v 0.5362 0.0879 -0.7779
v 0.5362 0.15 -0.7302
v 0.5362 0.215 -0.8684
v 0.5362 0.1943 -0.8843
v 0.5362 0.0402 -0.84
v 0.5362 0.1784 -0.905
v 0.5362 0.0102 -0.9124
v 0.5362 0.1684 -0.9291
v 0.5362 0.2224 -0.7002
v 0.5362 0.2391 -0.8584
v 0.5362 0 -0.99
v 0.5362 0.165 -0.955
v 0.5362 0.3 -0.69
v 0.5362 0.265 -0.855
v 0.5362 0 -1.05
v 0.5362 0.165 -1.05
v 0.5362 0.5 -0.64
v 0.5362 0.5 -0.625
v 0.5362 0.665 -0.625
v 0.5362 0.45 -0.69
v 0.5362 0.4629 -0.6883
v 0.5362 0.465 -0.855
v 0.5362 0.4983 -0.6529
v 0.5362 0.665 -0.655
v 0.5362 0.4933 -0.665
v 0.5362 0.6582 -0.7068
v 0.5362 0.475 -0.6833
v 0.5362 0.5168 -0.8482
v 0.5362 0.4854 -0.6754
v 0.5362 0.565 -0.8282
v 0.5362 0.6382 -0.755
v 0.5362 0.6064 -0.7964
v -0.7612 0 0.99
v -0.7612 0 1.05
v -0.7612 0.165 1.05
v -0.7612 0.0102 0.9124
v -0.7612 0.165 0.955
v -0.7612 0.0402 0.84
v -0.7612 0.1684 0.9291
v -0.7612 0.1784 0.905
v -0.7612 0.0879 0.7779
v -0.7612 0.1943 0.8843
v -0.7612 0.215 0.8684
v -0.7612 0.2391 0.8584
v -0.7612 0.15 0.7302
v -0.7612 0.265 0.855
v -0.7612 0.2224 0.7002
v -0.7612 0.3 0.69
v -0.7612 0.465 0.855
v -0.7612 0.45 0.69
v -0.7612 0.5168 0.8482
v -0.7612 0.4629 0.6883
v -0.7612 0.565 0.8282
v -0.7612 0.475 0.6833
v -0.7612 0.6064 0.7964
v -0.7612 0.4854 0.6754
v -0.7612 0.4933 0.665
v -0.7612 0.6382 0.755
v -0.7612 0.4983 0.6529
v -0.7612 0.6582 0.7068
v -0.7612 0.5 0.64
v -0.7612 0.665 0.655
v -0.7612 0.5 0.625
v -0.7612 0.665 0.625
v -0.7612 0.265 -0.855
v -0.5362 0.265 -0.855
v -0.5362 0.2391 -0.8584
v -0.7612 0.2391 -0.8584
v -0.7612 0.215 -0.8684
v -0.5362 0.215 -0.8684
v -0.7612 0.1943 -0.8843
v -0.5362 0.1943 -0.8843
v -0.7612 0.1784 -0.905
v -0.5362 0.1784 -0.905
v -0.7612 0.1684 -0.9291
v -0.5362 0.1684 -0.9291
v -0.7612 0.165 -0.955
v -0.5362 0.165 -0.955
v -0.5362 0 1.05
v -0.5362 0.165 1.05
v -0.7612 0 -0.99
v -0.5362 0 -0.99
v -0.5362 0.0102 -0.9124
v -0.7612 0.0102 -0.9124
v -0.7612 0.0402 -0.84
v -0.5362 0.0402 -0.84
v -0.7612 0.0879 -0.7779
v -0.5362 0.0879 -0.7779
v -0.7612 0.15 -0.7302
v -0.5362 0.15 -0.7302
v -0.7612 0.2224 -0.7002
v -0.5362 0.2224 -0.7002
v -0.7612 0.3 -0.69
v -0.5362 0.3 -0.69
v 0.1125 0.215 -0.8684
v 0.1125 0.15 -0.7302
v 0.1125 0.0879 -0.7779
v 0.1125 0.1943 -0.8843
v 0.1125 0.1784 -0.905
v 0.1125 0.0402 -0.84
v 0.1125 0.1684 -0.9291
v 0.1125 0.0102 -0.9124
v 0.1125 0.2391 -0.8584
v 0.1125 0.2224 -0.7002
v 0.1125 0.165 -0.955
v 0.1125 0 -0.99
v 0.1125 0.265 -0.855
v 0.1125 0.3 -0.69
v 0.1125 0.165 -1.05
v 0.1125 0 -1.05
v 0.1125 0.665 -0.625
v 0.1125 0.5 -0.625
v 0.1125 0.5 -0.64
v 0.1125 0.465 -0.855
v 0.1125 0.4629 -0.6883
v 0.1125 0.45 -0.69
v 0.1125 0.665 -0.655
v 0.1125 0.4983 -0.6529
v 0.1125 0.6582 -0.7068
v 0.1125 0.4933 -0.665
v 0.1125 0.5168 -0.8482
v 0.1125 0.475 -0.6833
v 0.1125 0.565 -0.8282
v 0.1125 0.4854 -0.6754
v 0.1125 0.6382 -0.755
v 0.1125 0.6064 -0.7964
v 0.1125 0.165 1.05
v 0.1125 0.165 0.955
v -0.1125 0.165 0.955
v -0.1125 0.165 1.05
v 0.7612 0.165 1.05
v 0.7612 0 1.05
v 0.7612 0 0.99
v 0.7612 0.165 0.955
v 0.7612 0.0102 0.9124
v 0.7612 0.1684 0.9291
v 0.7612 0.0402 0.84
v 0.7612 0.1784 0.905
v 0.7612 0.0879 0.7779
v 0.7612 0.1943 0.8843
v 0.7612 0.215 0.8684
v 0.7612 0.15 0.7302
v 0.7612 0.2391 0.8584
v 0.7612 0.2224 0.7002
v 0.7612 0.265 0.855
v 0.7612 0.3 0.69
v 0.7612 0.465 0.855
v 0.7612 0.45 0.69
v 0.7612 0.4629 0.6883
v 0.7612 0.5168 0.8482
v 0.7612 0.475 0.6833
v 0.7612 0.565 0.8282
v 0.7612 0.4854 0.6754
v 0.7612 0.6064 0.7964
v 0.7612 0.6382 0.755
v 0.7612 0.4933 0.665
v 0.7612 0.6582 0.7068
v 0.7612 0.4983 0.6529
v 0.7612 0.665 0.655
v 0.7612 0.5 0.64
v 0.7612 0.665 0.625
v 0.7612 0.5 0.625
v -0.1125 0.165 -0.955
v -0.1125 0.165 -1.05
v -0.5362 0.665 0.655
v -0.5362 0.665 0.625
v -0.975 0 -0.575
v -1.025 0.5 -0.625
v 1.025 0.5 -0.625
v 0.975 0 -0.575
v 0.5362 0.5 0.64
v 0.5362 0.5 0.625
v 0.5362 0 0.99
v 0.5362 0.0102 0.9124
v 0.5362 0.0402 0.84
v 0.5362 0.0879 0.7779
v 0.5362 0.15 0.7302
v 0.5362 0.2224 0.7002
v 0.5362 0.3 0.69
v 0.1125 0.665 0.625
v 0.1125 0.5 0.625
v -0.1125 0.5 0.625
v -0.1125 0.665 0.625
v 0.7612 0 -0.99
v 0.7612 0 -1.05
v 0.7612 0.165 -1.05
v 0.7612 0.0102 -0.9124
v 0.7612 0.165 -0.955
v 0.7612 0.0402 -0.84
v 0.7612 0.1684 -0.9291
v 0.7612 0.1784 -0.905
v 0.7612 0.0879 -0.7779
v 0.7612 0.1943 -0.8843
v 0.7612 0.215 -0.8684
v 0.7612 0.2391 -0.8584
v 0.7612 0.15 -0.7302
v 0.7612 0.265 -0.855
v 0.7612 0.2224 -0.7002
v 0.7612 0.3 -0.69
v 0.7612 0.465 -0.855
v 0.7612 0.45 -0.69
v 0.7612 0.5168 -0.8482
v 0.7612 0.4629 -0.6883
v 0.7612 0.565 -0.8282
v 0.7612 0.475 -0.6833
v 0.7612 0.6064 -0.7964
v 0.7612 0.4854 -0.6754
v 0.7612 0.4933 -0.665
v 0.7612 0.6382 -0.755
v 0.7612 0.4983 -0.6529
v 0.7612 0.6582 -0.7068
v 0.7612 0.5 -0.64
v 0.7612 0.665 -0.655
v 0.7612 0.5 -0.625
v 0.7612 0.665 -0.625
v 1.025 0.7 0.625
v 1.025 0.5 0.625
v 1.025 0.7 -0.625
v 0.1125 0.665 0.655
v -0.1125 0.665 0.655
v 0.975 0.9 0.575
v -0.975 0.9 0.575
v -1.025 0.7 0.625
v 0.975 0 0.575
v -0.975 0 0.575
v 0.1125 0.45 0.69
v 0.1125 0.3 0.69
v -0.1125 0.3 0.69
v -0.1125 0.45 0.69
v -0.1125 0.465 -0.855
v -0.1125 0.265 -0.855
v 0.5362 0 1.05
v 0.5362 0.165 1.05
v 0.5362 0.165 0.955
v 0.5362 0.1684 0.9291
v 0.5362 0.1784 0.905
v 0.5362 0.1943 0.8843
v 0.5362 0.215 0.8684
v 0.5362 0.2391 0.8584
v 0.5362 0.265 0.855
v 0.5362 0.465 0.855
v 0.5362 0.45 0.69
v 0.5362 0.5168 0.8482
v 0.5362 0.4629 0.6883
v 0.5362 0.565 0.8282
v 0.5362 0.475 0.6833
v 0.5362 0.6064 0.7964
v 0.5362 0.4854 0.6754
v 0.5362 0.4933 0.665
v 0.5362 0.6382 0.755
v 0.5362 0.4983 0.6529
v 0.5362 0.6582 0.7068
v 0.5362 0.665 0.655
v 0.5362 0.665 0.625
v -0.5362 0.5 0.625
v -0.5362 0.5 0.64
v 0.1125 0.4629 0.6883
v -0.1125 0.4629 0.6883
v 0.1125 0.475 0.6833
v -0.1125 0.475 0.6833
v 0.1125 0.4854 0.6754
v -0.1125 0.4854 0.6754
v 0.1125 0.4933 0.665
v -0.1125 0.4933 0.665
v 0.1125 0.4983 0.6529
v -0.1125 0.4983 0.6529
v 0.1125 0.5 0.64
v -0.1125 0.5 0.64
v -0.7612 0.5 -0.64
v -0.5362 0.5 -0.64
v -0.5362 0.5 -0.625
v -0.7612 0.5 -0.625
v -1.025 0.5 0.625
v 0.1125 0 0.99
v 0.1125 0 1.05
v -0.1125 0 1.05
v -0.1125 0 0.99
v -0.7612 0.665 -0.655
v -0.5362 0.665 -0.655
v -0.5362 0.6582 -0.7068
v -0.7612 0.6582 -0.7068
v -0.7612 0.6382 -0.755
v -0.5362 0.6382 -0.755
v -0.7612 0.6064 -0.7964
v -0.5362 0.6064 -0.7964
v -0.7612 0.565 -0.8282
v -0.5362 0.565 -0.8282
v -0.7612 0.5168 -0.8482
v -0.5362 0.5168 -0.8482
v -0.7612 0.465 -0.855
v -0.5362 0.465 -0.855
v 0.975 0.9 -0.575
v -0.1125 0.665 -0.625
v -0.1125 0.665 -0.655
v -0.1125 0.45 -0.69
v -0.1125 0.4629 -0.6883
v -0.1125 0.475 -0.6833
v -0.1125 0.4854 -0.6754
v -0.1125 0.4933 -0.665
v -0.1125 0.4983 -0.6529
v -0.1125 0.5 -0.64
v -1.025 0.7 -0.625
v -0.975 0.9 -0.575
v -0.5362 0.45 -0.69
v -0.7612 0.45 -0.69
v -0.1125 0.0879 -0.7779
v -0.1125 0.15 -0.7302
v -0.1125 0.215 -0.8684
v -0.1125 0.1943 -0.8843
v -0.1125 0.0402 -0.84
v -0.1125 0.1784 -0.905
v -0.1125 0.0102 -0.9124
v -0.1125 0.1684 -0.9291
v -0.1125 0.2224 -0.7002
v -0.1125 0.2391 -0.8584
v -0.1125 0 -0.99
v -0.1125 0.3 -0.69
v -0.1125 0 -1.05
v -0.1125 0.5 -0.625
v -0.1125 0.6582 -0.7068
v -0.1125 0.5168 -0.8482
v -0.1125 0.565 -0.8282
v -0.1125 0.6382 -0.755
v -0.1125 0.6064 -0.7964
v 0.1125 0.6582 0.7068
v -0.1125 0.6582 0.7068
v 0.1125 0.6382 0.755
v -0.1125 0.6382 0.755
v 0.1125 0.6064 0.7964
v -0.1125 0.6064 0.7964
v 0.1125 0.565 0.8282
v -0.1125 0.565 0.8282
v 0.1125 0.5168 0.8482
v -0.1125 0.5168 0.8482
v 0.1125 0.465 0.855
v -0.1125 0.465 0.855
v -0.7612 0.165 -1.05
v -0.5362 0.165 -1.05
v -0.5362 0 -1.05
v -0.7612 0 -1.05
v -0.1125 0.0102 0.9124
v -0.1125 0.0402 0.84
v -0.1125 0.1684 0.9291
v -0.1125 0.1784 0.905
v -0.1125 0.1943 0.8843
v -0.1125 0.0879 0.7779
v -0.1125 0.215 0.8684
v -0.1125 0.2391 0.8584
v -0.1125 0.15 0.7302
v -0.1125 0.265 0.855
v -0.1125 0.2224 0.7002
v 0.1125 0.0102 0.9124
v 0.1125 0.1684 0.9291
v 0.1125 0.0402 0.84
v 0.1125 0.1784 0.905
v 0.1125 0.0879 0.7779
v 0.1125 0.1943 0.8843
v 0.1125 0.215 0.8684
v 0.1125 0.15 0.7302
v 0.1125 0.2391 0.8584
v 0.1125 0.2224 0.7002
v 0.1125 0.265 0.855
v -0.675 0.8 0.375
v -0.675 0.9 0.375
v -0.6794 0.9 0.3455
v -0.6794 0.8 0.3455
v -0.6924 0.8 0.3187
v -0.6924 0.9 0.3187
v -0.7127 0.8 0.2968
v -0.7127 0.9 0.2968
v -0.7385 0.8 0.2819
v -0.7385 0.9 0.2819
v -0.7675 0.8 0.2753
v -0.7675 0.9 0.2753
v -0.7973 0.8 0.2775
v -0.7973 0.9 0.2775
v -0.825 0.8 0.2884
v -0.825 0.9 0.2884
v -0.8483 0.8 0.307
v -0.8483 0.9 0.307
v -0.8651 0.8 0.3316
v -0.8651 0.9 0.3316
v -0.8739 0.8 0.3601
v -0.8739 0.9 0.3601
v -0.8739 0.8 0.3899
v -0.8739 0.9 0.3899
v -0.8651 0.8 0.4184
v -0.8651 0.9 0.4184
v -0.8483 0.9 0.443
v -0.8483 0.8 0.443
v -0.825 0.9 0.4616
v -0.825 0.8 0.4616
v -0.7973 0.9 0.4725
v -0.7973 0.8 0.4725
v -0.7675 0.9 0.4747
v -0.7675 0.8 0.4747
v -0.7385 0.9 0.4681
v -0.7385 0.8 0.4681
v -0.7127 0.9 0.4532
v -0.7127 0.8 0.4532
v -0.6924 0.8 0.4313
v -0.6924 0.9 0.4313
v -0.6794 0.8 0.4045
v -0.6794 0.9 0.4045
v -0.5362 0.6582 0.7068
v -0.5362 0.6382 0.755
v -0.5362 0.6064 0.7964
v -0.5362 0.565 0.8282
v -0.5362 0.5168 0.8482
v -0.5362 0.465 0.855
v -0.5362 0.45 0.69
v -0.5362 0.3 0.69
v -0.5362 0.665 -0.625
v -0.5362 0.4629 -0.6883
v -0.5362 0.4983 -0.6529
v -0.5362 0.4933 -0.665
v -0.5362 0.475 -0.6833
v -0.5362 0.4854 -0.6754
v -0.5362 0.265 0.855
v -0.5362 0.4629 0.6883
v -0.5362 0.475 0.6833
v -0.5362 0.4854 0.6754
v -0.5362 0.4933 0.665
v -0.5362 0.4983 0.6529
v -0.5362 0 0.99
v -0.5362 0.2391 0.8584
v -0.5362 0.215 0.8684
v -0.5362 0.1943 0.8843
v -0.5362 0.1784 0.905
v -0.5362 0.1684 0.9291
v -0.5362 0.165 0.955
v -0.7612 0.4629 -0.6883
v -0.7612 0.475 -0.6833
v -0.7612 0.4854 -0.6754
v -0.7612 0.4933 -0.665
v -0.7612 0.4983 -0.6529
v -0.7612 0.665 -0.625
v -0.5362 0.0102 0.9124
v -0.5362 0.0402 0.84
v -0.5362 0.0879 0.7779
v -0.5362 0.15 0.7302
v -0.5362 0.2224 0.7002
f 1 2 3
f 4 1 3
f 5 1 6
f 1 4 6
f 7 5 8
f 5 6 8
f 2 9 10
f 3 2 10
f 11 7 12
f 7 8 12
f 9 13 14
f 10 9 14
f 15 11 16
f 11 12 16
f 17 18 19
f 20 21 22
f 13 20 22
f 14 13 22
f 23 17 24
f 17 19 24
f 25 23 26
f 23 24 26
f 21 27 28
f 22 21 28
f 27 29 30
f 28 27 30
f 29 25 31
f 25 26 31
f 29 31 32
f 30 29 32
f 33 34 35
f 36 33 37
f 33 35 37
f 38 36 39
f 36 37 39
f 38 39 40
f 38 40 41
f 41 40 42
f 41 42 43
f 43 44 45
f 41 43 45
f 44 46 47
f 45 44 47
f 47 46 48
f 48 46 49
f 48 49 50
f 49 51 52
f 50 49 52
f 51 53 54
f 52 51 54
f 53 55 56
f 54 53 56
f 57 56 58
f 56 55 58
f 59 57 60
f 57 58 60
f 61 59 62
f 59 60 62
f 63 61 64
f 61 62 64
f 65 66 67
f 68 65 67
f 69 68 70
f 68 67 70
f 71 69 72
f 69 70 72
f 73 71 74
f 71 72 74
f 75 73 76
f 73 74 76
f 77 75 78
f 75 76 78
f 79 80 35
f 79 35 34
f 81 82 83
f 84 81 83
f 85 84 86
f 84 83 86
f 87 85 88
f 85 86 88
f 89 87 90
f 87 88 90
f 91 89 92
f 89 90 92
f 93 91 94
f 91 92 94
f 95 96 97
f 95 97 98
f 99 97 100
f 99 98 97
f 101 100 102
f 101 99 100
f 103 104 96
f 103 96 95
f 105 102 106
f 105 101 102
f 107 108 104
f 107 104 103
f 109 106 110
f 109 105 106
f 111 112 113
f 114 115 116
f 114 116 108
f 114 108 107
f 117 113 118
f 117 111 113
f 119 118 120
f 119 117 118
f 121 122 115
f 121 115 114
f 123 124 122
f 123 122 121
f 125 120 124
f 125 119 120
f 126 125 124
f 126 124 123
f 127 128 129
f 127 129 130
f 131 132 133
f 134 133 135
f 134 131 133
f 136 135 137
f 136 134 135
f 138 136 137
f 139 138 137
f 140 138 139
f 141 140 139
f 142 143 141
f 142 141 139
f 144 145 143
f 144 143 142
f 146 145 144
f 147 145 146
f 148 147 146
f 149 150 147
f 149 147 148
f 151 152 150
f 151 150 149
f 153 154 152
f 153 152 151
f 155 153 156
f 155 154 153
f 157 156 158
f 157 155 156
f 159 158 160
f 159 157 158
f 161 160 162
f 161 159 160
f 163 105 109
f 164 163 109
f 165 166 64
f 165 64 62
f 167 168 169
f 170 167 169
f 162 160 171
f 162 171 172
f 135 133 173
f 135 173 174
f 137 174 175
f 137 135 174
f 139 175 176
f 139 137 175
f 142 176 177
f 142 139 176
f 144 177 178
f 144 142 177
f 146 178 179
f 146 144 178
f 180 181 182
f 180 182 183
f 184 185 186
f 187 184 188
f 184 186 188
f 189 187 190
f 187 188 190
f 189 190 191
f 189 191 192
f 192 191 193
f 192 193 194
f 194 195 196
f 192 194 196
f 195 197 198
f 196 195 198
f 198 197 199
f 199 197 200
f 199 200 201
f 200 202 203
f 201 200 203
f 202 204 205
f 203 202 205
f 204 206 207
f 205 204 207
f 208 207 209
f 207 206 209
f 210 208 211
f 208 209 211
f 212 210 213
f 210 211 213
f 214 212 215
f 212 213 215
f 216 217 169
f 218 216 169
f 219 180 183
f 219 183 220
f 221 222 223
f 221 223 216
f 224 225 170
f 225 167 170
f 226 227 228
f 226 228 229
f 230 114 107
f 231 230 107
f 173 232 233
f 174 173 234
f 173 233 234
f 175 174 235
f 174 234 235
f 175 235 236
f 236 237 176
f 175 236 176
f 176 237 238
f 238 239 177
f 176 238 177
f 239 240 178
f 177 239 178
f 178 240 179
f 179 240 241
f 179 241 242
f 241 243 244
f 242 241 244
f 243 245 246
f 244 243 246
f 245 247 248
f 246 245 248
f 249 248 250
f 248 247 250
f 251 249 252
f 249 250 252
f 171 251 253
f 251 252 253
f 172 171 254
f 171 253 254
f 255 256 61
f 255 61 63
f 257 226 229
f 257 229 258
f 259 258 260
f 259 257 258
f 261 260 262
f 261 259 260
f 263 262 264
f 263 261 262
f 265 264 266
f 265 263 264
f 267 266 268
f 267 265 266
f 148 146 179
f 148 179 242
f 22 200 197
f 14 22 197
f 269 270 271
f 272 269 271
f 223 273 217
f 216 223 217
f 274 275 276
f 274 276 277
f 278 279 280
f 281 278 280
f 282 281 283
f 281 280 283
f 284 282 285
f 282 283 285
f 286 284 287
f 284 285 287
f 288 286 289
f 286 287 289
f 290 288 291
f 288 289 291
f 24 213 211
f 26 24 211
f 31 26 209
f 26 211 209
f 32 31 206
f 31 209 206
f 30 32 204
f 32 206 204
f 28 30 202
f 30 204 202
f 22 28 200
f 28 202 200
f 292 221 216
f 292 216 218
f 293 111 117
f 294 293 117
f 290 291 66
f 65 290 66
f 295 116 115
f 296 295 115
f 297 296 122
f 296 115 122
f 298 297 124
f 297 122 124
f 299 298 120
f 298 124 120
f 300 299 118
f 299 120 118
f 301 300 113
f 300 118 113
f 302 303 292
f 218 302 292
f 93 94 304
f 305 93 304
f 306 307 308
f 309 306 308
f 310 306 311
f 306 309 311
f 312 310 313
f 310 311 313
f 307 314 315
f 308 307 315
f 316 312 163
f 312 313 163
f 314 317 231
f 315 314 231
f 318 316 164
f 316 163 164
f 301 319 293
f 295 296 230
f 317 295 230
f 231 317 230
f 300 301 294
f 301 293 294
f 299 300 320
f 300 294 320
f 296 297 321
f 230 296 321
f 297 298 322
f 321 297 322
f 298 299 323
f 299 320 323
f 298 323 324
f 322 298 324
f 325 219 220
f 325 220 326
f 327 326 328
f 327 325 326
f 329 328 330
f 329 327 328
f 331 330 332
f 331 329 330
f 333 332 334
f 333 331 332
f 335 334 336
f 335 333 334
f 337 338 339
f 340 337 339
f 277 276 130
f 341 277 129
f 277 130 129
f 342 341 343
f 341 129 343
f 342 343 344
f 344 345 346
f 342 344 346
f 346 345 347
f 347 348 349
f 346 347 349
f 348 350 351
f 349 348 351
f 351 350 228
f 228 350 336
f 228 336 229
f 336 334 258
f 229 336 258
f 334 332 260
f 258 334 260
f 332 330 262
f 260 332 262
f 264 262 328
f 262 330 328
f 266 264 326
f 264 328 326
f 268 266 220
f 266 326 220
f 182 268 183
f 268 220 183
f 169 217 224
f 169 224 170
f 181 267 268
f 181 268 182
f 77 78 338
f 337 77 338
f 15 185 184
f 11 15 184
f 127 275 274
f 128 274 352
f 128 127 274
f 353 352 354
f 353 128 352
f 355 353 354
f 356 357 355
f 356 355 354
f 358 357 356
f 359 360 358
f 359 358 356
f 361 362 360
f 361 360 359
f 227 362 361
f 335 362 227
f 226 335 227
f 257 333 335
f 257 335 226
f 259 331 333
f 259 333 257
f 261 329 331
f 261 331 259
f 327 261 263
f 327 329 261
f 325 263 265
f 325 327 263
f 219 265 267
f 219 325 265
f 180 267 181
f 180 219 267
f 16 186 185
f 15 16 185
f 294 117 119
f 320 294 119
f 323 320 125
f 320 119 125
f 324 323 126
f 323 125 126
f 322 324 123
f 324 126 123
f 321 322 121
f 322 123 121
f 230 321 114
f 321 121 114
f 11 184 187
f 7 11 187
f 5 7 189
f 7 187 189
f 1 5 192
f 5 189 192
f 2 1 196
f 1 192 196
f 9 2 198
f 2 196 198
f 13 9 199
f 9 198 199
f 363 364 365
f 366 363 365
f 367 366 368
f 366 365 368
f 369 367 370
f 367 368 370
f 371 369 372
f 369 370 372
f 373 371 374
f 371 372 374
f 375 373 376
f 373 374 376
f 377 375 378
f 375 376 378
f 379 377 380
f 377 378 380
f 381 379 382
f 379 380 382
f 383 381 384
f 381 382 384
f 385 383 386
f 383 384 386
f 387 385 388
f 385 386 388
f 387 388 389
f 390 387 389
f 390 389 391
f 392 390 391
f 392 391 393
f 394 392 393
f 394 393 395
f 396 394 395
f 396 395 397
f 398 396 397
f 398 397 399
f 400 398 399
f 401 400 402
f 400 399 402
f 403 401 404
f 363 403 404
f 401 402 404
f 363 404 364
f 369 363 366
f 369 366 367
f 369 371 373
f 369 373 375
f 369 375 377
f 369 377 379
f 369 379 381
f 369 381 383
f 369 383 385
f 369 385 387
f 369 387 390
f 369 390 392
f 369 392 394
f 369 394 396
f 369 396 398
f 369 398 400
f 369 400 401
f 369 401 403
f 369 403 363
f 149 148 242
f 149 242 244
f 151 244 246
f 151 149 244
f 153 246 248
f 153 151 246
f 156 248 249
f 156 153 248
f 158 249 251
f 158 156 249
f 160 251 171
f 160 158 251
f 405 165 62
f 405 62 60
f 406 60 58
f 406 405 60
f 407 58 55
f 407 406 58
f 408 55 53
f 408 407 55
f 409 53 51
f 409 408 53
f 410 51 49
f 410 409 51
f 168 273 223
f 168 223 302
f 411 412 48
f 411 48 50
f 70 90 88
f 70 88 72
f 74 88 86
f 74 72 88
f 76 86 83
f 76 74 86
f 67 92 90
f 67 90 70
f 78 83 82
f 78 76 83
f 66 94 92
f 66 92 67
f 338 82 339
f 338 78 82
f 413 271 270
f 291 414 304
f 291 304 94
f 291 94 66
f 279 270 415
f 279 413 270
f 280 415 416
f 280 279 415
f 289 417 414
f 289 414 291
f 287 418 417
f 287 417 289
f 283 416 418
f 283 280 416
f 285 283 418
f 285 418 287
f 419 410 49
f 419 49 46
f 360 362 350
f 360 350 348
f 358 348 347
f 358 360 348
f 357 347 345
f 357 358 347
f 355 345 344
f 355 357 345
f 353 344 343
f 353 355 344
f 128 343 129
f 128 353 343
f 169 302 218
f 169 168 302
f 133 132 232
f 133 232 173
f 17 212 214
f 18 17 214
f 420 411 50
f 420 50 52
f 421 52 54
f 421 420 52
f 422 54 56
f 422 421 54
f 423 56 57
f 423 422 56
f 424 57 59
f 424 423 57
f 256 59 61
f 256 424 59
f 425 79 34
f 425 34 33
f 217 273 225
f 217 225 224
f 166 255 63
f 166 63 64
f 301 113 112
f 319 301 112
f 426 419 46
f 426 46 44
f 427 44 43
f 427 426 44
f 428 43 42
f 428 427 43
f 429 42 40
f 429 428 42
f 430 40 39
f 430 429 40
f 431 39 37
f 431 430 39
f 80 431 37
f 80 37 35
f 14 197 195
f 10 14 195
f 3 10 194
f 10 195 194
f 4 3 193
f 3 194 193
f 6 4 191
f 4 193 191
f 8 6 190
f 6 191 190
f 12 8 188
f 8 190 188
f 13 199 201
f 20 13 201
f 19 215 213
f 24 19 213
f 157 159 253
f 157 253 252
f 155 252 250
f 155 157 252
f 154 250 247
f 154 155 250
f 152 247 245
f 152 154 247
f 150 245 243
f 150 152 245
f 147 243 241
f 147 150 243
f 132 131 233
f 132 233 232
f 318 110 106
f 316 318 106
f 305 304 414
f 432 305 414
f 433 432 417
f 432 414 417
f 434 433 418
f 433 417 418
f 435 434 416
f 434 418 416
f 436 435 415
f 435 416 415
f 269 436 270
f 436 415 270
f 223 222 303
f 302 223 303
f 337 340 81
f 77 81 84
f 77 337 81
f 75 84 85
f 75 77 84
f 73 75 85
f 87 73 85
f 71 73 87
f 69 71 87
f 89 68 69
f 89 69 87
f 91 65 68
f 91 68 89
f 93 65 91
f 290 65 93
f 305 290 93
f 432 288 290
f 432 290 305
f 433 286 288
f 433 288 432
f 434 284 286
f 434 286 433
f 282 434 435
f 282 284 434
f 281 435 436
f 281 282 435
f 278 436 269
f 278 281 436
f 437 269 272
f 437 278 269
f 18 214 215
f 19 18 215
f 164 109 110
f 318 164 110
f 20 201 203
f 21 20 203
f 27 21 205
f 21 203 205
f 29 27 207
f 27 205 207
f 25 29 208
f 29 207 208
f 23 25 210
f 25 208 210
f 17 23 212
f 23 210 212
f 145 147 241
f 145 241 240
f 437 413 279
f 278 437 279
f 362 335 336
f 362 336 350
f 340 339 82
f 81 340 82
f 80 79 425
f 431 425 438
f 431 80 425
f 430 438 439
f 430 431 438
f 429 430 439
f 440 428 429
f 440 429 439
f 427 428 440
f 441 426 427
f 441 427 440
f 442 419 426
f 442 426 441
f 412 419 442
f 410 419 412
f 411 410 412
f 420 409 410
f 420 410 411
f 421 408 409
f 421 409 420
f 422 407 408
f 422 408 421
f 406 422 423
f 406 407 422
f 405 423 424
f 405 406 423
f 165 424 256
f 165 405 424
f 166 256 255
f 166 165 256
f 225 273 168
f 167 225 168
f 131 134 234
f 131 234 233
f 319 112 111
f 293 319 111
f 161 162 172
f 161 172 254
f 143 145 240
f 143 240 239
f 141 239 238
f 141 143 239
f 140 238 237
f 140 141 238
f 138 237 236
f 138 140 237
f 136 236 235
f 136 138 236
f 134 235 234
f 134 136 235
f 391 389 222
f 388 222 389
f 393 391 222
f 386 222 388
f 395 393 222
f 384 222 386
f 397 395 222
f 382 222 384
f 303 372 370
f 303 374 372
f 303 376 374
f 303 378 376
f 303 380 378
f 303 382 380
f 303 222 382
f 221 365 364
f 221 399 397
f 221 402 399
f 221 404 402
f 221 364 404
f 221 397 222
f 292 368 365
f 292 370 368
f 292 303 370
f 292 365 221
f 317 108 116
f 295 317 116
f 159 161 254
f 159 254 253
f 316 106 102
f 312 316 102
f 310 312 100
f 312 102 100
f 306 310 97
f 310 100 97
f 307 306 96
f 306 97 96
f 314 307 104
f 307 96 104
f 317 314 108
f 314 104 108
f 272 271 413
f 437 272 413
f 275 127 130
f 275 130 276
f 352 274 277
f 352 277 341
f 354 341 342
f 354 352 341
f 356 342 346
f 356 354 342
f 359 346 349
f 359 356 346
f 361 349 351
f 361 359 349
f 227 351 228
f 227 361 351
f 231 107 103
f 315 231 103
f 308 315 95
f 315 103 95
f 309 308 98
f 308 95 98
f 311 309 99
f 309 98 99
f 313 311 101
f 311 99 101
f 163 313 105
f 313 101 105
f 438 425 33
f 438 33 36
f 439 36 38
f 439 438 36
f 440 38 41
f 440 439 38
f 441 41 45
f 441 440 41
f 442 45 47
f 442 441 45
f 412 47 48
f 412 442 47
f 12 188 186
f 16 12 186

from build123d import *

# Parameters (mm, degrees)
SKETCH1_W             = 2.05
SKETCH1_H             = 1.25
BOSS_EXTRUDE1_DEPTH   = 0.9
BOSS_EXTRUDE2_START   = -1.025
BOSS_EXTRUDE2_DEPTH   = 0.76125
BOSS_EXTRUDE2_2_DEPTH = 0.76125
SKETCH3_W             = 0.42375
SKETCH3_H             = 0.425
CUT_EXTRUDE2_DEPTH    = 0.9
CHAMFER1_SIZE         = 0.05
CHAMFER1_SIZE2        = 0.5
CHAMFER2_SIZE         = 0.2
CHAMFER2_SIZE2        = 0.05
CHAMFER2_PART_2_SIZE  = 0.2
CHAMFER2_PART_2_SIZE2 = 0.05
CHAMFER2_PART_3_SIZE  = 0.2
CHAMFER2_PART_3_SIZE2 = 0.05
CHAMFER2_PART_4_SIZE  = 0.2
CHAMFER2_PART_4_SIZE2 = 0.05
SKETCH4_R             = 0.1
CUT_EXTRUDE3_DEPTH    = 0.1


with BuildPart() as part:
    # Sketch1 → Boss-Extrude1 (new body)
    with BuildSketch(Plane(origin=(0, 0, 0), x_dir=(1, 0, 0), z_dir=(0, 1, 0))):
        Rectangle(SKETCH1_W, SKETCH1_H)
    extrude(amount=BOSS_EXTRUDE1_DEPTH)

    # Chamfer1
    chamfer1_edges = [part.edges().sort_by_distance(p)[0] for p in [
        (0, 0, 0.625),
        (-1.025, 0, 0),
        (0, 0, -0.625),
        (1.025, 0, 0),
    ]]
    chamfer1_side = [part.faces().sort_by_distance(p)[0] for p in [
        (0, 0, 0),
    ]]
    chamfer(chamfer1_edges, length=CHAMFER1_SIZE, length2=CHAMFER1_SIZE2, reference=chamfer1_side[0])

    # Chamfer2
    chamfer2_edges = [part.edges().sort_by_distance(p)[0] for p in [
        (-1.025, 0.9, 0),
    ]]
    chamfer2_side = [part.faces().sort_by_distance(p)[0] for p in [
        (-1.025, 0.7, 0),
    ]]
    chamfer(chamfer2_edges, length=CHAMFER2_SIZE, length2=CHAMFER2_SIZE2, reference=chamfer2_side[0])

    # Chamfer2 part 2
    chamfer2_part_2_edges = [part.edges().sort_by_distance(p)[0] for p in [
        (0, 0.9, 0.625),
    ]]
    chamfer2_part_2_side = [part.faces().sort_by_distance(p)[0] for p in [
        (0, 0.7, 0.625),
    ]]
    chamfer(chamfer2_part_2_edges, length=CHAMFER2_PART_2_SIZE, length2=CHAMFER2_PART_2_SIZE2, reference=chamfer2_part_2_side[0])

    # Chamfer2 part 3
    chamfer2_part_3_edges = [part.edges().sort_by_distance(p)[0] for p in [
        (1.025, 0.9, 0),
    ]]
    chamfer2_part_3_side = [part.faces().sort_by_distance(p)[0] for p in [
        (1.025, 0.7, 0),
    ]]
    chamfer(chamfer2_part_3_edges, length=CHAMFER2_PART_3_SIZE, length2=CHAMFER2_PART_3_SIZE2, reference=chamfer2_part_3_side[0])

    # Chamfer2 part 4
    chamfer2_part_4_edges = [part.edges().sort_by_distance(p)[0] for p in [
        (0, 0.9, -0.625),
    ]]
    chamfer2_part_4_side = [part.faces().sort_by_distance(p)[0] for p in [
        (0, 0.7, -0.625),
    ]]
    chamfer(chamfer2_part_4_edges, length=CHAMFER2_PART_4_SIZE, length2=CHAMFER2_PART_4_SIZE2, reference=chamfer2_part_4_side[0])

    # Sketch4 → Cut-Extrude3 (cut)
    with BuildSketch(Plane(origin=(0, 0.9, 0), x_dir=(1, 0, 0), z_dir=(0, 1, 0))):
        with Locations((-0.775, -0.375)):
            Circle(SKETCH4_R)
    extrude(amount=-CUT_EXTRUDE3_DEPTH, mode=Mode.SUBTRACT)


with BuildPart() as body_2:
    # Sketch2 → Boss-Extrude2 (new body, symmetric)
    with BuildSketch(Plane(origin=(1.025, 0, 0), x_dir=(0, 0, -1), z_dir=(1, 0, 0)).offset(BOSS_EXTRUDE2_START)):
        with BuildLine():
            Line((-0.625, 0.665), (-0.655, 0.665))
            ThreePointArc((-0.655, 0.665), (-0.796421356, 0.606421356), (-0.855, 0.465))
            Line((-0.855, 0.465), (-0.855, 0.265))
            ThreePointArc((-0.855, 0.265), (-0.884289322, 0.194289322), (-0.955, 0.165))
            Line((-0.955, 0.165), (-1.05, 0.165))
            Line((-1.05, 0.165), (-1.05, 0))
            Line((-1.05, 0), (-0.99, 0))
            ThreePointArc((-0.99, 0), (-0.777867966, 0.087867966), (-0.69, 0.3))
            Line((-0.69, 0.3), (-0.69, 0.45))
            ThreePointArc((-0.69, 0.45), (-0.675355339, 0.485355339), (-0.64, 0.5))
            Line((-0.64, 0.5), (-0.625, 0.5))
            Line((-0.625, 0.5), (-0.625, 0.665))
        make_face()
    extrude(amount=BOSS_EXTRUDE2_DEPTH, both=True)


with BuildPart() as body_3:
    # Sketch2 → Boss-Extrude2 2 (new body, symmetric)
    with BuildSketch(Plane(origin=(1.025, 0, 0), x_dir=(0, 0, -1), z_dir=(1, 0, 0)).offset(BOSS_EXTRUDE2_START)):
        with BuildLine():
            Line((1.05, 0.165), (1.05, 0))
            Line((1.05, 0), (0.99, 0))
            ThreePointArc((0.99, 0), (0.777867966, 0.087867966), (0.69, 0.3))
            Line((0.69, 0.3), (0.69, 0.45))
            ThreePointArc((0.69, 0.45), (0.675355339, 0.485355339), (0.64, 0.5))
            Line((0.64, 0.5), (0.625, 0.5))
            Line((0.625, 0.5), (0.625, 0.665))
            Line((0.625, 0.665), (0.655, 0.665))
            ThreePointArc((0.655, 0.665), (0.796421356, 0.606421356), (0.855, 0.465))
            Line((0.855, 0.465), (0.855, 0.265))
            ThreePointArc((0.855, 0.265), (0.884289322, 0.194289322), (0.955, 0.165))
            Line((0.955, 0.165), (1.05, 0.165))
        make_face()
    extrude(amount=BOSS_EXTRUDE2_2_DEPTH, both=True)


with BuildPart() as cut_extrude2_tool:
    # Sketch3 → Cut-Extrude2 (new body)
    with BuildSketch(Plane(origin=(0, 0.9, 0), x_dir=(1, 0, 0), z_dir=(0, 1, 0))):
        with Locations((-0.324375, 0.8375)):
            Rectangle(SKETCH3_W, SKETCH3_H)
        with Locations((0.324375, 0.8375)):
            Rectangle(SKETCH3_W, SKETCH3_H)
        with Locations((0.324375, -0.8375)):
            Rectangle(SKETCH3_W, SKETCH3_H)
        with Locations((-0.324375, -0.8375)):
            Rectangle(SKETCH3_W, SKETCH3_H)
    extrude(amount=-CUT_EXTRUDE2_DEPTH)


with BuildPart() as body_2_1:
    add(body_2.part)

    # Cut-Extrude2: cut by cut_extrude2_tool
    add(cut_extrude2_tool.part, mode=Mode.SUBTRACT)


with BuildPart() as body_3_1:
    add(body_3.part)

    # Cut-Extrude2: cut by cut_extrude2_tool
    add(cut_extrude2_tool.part, mode=Mode.SUBTRACT)


solid = Compound([part.part, body_2_1.part, body_3_1.part])
